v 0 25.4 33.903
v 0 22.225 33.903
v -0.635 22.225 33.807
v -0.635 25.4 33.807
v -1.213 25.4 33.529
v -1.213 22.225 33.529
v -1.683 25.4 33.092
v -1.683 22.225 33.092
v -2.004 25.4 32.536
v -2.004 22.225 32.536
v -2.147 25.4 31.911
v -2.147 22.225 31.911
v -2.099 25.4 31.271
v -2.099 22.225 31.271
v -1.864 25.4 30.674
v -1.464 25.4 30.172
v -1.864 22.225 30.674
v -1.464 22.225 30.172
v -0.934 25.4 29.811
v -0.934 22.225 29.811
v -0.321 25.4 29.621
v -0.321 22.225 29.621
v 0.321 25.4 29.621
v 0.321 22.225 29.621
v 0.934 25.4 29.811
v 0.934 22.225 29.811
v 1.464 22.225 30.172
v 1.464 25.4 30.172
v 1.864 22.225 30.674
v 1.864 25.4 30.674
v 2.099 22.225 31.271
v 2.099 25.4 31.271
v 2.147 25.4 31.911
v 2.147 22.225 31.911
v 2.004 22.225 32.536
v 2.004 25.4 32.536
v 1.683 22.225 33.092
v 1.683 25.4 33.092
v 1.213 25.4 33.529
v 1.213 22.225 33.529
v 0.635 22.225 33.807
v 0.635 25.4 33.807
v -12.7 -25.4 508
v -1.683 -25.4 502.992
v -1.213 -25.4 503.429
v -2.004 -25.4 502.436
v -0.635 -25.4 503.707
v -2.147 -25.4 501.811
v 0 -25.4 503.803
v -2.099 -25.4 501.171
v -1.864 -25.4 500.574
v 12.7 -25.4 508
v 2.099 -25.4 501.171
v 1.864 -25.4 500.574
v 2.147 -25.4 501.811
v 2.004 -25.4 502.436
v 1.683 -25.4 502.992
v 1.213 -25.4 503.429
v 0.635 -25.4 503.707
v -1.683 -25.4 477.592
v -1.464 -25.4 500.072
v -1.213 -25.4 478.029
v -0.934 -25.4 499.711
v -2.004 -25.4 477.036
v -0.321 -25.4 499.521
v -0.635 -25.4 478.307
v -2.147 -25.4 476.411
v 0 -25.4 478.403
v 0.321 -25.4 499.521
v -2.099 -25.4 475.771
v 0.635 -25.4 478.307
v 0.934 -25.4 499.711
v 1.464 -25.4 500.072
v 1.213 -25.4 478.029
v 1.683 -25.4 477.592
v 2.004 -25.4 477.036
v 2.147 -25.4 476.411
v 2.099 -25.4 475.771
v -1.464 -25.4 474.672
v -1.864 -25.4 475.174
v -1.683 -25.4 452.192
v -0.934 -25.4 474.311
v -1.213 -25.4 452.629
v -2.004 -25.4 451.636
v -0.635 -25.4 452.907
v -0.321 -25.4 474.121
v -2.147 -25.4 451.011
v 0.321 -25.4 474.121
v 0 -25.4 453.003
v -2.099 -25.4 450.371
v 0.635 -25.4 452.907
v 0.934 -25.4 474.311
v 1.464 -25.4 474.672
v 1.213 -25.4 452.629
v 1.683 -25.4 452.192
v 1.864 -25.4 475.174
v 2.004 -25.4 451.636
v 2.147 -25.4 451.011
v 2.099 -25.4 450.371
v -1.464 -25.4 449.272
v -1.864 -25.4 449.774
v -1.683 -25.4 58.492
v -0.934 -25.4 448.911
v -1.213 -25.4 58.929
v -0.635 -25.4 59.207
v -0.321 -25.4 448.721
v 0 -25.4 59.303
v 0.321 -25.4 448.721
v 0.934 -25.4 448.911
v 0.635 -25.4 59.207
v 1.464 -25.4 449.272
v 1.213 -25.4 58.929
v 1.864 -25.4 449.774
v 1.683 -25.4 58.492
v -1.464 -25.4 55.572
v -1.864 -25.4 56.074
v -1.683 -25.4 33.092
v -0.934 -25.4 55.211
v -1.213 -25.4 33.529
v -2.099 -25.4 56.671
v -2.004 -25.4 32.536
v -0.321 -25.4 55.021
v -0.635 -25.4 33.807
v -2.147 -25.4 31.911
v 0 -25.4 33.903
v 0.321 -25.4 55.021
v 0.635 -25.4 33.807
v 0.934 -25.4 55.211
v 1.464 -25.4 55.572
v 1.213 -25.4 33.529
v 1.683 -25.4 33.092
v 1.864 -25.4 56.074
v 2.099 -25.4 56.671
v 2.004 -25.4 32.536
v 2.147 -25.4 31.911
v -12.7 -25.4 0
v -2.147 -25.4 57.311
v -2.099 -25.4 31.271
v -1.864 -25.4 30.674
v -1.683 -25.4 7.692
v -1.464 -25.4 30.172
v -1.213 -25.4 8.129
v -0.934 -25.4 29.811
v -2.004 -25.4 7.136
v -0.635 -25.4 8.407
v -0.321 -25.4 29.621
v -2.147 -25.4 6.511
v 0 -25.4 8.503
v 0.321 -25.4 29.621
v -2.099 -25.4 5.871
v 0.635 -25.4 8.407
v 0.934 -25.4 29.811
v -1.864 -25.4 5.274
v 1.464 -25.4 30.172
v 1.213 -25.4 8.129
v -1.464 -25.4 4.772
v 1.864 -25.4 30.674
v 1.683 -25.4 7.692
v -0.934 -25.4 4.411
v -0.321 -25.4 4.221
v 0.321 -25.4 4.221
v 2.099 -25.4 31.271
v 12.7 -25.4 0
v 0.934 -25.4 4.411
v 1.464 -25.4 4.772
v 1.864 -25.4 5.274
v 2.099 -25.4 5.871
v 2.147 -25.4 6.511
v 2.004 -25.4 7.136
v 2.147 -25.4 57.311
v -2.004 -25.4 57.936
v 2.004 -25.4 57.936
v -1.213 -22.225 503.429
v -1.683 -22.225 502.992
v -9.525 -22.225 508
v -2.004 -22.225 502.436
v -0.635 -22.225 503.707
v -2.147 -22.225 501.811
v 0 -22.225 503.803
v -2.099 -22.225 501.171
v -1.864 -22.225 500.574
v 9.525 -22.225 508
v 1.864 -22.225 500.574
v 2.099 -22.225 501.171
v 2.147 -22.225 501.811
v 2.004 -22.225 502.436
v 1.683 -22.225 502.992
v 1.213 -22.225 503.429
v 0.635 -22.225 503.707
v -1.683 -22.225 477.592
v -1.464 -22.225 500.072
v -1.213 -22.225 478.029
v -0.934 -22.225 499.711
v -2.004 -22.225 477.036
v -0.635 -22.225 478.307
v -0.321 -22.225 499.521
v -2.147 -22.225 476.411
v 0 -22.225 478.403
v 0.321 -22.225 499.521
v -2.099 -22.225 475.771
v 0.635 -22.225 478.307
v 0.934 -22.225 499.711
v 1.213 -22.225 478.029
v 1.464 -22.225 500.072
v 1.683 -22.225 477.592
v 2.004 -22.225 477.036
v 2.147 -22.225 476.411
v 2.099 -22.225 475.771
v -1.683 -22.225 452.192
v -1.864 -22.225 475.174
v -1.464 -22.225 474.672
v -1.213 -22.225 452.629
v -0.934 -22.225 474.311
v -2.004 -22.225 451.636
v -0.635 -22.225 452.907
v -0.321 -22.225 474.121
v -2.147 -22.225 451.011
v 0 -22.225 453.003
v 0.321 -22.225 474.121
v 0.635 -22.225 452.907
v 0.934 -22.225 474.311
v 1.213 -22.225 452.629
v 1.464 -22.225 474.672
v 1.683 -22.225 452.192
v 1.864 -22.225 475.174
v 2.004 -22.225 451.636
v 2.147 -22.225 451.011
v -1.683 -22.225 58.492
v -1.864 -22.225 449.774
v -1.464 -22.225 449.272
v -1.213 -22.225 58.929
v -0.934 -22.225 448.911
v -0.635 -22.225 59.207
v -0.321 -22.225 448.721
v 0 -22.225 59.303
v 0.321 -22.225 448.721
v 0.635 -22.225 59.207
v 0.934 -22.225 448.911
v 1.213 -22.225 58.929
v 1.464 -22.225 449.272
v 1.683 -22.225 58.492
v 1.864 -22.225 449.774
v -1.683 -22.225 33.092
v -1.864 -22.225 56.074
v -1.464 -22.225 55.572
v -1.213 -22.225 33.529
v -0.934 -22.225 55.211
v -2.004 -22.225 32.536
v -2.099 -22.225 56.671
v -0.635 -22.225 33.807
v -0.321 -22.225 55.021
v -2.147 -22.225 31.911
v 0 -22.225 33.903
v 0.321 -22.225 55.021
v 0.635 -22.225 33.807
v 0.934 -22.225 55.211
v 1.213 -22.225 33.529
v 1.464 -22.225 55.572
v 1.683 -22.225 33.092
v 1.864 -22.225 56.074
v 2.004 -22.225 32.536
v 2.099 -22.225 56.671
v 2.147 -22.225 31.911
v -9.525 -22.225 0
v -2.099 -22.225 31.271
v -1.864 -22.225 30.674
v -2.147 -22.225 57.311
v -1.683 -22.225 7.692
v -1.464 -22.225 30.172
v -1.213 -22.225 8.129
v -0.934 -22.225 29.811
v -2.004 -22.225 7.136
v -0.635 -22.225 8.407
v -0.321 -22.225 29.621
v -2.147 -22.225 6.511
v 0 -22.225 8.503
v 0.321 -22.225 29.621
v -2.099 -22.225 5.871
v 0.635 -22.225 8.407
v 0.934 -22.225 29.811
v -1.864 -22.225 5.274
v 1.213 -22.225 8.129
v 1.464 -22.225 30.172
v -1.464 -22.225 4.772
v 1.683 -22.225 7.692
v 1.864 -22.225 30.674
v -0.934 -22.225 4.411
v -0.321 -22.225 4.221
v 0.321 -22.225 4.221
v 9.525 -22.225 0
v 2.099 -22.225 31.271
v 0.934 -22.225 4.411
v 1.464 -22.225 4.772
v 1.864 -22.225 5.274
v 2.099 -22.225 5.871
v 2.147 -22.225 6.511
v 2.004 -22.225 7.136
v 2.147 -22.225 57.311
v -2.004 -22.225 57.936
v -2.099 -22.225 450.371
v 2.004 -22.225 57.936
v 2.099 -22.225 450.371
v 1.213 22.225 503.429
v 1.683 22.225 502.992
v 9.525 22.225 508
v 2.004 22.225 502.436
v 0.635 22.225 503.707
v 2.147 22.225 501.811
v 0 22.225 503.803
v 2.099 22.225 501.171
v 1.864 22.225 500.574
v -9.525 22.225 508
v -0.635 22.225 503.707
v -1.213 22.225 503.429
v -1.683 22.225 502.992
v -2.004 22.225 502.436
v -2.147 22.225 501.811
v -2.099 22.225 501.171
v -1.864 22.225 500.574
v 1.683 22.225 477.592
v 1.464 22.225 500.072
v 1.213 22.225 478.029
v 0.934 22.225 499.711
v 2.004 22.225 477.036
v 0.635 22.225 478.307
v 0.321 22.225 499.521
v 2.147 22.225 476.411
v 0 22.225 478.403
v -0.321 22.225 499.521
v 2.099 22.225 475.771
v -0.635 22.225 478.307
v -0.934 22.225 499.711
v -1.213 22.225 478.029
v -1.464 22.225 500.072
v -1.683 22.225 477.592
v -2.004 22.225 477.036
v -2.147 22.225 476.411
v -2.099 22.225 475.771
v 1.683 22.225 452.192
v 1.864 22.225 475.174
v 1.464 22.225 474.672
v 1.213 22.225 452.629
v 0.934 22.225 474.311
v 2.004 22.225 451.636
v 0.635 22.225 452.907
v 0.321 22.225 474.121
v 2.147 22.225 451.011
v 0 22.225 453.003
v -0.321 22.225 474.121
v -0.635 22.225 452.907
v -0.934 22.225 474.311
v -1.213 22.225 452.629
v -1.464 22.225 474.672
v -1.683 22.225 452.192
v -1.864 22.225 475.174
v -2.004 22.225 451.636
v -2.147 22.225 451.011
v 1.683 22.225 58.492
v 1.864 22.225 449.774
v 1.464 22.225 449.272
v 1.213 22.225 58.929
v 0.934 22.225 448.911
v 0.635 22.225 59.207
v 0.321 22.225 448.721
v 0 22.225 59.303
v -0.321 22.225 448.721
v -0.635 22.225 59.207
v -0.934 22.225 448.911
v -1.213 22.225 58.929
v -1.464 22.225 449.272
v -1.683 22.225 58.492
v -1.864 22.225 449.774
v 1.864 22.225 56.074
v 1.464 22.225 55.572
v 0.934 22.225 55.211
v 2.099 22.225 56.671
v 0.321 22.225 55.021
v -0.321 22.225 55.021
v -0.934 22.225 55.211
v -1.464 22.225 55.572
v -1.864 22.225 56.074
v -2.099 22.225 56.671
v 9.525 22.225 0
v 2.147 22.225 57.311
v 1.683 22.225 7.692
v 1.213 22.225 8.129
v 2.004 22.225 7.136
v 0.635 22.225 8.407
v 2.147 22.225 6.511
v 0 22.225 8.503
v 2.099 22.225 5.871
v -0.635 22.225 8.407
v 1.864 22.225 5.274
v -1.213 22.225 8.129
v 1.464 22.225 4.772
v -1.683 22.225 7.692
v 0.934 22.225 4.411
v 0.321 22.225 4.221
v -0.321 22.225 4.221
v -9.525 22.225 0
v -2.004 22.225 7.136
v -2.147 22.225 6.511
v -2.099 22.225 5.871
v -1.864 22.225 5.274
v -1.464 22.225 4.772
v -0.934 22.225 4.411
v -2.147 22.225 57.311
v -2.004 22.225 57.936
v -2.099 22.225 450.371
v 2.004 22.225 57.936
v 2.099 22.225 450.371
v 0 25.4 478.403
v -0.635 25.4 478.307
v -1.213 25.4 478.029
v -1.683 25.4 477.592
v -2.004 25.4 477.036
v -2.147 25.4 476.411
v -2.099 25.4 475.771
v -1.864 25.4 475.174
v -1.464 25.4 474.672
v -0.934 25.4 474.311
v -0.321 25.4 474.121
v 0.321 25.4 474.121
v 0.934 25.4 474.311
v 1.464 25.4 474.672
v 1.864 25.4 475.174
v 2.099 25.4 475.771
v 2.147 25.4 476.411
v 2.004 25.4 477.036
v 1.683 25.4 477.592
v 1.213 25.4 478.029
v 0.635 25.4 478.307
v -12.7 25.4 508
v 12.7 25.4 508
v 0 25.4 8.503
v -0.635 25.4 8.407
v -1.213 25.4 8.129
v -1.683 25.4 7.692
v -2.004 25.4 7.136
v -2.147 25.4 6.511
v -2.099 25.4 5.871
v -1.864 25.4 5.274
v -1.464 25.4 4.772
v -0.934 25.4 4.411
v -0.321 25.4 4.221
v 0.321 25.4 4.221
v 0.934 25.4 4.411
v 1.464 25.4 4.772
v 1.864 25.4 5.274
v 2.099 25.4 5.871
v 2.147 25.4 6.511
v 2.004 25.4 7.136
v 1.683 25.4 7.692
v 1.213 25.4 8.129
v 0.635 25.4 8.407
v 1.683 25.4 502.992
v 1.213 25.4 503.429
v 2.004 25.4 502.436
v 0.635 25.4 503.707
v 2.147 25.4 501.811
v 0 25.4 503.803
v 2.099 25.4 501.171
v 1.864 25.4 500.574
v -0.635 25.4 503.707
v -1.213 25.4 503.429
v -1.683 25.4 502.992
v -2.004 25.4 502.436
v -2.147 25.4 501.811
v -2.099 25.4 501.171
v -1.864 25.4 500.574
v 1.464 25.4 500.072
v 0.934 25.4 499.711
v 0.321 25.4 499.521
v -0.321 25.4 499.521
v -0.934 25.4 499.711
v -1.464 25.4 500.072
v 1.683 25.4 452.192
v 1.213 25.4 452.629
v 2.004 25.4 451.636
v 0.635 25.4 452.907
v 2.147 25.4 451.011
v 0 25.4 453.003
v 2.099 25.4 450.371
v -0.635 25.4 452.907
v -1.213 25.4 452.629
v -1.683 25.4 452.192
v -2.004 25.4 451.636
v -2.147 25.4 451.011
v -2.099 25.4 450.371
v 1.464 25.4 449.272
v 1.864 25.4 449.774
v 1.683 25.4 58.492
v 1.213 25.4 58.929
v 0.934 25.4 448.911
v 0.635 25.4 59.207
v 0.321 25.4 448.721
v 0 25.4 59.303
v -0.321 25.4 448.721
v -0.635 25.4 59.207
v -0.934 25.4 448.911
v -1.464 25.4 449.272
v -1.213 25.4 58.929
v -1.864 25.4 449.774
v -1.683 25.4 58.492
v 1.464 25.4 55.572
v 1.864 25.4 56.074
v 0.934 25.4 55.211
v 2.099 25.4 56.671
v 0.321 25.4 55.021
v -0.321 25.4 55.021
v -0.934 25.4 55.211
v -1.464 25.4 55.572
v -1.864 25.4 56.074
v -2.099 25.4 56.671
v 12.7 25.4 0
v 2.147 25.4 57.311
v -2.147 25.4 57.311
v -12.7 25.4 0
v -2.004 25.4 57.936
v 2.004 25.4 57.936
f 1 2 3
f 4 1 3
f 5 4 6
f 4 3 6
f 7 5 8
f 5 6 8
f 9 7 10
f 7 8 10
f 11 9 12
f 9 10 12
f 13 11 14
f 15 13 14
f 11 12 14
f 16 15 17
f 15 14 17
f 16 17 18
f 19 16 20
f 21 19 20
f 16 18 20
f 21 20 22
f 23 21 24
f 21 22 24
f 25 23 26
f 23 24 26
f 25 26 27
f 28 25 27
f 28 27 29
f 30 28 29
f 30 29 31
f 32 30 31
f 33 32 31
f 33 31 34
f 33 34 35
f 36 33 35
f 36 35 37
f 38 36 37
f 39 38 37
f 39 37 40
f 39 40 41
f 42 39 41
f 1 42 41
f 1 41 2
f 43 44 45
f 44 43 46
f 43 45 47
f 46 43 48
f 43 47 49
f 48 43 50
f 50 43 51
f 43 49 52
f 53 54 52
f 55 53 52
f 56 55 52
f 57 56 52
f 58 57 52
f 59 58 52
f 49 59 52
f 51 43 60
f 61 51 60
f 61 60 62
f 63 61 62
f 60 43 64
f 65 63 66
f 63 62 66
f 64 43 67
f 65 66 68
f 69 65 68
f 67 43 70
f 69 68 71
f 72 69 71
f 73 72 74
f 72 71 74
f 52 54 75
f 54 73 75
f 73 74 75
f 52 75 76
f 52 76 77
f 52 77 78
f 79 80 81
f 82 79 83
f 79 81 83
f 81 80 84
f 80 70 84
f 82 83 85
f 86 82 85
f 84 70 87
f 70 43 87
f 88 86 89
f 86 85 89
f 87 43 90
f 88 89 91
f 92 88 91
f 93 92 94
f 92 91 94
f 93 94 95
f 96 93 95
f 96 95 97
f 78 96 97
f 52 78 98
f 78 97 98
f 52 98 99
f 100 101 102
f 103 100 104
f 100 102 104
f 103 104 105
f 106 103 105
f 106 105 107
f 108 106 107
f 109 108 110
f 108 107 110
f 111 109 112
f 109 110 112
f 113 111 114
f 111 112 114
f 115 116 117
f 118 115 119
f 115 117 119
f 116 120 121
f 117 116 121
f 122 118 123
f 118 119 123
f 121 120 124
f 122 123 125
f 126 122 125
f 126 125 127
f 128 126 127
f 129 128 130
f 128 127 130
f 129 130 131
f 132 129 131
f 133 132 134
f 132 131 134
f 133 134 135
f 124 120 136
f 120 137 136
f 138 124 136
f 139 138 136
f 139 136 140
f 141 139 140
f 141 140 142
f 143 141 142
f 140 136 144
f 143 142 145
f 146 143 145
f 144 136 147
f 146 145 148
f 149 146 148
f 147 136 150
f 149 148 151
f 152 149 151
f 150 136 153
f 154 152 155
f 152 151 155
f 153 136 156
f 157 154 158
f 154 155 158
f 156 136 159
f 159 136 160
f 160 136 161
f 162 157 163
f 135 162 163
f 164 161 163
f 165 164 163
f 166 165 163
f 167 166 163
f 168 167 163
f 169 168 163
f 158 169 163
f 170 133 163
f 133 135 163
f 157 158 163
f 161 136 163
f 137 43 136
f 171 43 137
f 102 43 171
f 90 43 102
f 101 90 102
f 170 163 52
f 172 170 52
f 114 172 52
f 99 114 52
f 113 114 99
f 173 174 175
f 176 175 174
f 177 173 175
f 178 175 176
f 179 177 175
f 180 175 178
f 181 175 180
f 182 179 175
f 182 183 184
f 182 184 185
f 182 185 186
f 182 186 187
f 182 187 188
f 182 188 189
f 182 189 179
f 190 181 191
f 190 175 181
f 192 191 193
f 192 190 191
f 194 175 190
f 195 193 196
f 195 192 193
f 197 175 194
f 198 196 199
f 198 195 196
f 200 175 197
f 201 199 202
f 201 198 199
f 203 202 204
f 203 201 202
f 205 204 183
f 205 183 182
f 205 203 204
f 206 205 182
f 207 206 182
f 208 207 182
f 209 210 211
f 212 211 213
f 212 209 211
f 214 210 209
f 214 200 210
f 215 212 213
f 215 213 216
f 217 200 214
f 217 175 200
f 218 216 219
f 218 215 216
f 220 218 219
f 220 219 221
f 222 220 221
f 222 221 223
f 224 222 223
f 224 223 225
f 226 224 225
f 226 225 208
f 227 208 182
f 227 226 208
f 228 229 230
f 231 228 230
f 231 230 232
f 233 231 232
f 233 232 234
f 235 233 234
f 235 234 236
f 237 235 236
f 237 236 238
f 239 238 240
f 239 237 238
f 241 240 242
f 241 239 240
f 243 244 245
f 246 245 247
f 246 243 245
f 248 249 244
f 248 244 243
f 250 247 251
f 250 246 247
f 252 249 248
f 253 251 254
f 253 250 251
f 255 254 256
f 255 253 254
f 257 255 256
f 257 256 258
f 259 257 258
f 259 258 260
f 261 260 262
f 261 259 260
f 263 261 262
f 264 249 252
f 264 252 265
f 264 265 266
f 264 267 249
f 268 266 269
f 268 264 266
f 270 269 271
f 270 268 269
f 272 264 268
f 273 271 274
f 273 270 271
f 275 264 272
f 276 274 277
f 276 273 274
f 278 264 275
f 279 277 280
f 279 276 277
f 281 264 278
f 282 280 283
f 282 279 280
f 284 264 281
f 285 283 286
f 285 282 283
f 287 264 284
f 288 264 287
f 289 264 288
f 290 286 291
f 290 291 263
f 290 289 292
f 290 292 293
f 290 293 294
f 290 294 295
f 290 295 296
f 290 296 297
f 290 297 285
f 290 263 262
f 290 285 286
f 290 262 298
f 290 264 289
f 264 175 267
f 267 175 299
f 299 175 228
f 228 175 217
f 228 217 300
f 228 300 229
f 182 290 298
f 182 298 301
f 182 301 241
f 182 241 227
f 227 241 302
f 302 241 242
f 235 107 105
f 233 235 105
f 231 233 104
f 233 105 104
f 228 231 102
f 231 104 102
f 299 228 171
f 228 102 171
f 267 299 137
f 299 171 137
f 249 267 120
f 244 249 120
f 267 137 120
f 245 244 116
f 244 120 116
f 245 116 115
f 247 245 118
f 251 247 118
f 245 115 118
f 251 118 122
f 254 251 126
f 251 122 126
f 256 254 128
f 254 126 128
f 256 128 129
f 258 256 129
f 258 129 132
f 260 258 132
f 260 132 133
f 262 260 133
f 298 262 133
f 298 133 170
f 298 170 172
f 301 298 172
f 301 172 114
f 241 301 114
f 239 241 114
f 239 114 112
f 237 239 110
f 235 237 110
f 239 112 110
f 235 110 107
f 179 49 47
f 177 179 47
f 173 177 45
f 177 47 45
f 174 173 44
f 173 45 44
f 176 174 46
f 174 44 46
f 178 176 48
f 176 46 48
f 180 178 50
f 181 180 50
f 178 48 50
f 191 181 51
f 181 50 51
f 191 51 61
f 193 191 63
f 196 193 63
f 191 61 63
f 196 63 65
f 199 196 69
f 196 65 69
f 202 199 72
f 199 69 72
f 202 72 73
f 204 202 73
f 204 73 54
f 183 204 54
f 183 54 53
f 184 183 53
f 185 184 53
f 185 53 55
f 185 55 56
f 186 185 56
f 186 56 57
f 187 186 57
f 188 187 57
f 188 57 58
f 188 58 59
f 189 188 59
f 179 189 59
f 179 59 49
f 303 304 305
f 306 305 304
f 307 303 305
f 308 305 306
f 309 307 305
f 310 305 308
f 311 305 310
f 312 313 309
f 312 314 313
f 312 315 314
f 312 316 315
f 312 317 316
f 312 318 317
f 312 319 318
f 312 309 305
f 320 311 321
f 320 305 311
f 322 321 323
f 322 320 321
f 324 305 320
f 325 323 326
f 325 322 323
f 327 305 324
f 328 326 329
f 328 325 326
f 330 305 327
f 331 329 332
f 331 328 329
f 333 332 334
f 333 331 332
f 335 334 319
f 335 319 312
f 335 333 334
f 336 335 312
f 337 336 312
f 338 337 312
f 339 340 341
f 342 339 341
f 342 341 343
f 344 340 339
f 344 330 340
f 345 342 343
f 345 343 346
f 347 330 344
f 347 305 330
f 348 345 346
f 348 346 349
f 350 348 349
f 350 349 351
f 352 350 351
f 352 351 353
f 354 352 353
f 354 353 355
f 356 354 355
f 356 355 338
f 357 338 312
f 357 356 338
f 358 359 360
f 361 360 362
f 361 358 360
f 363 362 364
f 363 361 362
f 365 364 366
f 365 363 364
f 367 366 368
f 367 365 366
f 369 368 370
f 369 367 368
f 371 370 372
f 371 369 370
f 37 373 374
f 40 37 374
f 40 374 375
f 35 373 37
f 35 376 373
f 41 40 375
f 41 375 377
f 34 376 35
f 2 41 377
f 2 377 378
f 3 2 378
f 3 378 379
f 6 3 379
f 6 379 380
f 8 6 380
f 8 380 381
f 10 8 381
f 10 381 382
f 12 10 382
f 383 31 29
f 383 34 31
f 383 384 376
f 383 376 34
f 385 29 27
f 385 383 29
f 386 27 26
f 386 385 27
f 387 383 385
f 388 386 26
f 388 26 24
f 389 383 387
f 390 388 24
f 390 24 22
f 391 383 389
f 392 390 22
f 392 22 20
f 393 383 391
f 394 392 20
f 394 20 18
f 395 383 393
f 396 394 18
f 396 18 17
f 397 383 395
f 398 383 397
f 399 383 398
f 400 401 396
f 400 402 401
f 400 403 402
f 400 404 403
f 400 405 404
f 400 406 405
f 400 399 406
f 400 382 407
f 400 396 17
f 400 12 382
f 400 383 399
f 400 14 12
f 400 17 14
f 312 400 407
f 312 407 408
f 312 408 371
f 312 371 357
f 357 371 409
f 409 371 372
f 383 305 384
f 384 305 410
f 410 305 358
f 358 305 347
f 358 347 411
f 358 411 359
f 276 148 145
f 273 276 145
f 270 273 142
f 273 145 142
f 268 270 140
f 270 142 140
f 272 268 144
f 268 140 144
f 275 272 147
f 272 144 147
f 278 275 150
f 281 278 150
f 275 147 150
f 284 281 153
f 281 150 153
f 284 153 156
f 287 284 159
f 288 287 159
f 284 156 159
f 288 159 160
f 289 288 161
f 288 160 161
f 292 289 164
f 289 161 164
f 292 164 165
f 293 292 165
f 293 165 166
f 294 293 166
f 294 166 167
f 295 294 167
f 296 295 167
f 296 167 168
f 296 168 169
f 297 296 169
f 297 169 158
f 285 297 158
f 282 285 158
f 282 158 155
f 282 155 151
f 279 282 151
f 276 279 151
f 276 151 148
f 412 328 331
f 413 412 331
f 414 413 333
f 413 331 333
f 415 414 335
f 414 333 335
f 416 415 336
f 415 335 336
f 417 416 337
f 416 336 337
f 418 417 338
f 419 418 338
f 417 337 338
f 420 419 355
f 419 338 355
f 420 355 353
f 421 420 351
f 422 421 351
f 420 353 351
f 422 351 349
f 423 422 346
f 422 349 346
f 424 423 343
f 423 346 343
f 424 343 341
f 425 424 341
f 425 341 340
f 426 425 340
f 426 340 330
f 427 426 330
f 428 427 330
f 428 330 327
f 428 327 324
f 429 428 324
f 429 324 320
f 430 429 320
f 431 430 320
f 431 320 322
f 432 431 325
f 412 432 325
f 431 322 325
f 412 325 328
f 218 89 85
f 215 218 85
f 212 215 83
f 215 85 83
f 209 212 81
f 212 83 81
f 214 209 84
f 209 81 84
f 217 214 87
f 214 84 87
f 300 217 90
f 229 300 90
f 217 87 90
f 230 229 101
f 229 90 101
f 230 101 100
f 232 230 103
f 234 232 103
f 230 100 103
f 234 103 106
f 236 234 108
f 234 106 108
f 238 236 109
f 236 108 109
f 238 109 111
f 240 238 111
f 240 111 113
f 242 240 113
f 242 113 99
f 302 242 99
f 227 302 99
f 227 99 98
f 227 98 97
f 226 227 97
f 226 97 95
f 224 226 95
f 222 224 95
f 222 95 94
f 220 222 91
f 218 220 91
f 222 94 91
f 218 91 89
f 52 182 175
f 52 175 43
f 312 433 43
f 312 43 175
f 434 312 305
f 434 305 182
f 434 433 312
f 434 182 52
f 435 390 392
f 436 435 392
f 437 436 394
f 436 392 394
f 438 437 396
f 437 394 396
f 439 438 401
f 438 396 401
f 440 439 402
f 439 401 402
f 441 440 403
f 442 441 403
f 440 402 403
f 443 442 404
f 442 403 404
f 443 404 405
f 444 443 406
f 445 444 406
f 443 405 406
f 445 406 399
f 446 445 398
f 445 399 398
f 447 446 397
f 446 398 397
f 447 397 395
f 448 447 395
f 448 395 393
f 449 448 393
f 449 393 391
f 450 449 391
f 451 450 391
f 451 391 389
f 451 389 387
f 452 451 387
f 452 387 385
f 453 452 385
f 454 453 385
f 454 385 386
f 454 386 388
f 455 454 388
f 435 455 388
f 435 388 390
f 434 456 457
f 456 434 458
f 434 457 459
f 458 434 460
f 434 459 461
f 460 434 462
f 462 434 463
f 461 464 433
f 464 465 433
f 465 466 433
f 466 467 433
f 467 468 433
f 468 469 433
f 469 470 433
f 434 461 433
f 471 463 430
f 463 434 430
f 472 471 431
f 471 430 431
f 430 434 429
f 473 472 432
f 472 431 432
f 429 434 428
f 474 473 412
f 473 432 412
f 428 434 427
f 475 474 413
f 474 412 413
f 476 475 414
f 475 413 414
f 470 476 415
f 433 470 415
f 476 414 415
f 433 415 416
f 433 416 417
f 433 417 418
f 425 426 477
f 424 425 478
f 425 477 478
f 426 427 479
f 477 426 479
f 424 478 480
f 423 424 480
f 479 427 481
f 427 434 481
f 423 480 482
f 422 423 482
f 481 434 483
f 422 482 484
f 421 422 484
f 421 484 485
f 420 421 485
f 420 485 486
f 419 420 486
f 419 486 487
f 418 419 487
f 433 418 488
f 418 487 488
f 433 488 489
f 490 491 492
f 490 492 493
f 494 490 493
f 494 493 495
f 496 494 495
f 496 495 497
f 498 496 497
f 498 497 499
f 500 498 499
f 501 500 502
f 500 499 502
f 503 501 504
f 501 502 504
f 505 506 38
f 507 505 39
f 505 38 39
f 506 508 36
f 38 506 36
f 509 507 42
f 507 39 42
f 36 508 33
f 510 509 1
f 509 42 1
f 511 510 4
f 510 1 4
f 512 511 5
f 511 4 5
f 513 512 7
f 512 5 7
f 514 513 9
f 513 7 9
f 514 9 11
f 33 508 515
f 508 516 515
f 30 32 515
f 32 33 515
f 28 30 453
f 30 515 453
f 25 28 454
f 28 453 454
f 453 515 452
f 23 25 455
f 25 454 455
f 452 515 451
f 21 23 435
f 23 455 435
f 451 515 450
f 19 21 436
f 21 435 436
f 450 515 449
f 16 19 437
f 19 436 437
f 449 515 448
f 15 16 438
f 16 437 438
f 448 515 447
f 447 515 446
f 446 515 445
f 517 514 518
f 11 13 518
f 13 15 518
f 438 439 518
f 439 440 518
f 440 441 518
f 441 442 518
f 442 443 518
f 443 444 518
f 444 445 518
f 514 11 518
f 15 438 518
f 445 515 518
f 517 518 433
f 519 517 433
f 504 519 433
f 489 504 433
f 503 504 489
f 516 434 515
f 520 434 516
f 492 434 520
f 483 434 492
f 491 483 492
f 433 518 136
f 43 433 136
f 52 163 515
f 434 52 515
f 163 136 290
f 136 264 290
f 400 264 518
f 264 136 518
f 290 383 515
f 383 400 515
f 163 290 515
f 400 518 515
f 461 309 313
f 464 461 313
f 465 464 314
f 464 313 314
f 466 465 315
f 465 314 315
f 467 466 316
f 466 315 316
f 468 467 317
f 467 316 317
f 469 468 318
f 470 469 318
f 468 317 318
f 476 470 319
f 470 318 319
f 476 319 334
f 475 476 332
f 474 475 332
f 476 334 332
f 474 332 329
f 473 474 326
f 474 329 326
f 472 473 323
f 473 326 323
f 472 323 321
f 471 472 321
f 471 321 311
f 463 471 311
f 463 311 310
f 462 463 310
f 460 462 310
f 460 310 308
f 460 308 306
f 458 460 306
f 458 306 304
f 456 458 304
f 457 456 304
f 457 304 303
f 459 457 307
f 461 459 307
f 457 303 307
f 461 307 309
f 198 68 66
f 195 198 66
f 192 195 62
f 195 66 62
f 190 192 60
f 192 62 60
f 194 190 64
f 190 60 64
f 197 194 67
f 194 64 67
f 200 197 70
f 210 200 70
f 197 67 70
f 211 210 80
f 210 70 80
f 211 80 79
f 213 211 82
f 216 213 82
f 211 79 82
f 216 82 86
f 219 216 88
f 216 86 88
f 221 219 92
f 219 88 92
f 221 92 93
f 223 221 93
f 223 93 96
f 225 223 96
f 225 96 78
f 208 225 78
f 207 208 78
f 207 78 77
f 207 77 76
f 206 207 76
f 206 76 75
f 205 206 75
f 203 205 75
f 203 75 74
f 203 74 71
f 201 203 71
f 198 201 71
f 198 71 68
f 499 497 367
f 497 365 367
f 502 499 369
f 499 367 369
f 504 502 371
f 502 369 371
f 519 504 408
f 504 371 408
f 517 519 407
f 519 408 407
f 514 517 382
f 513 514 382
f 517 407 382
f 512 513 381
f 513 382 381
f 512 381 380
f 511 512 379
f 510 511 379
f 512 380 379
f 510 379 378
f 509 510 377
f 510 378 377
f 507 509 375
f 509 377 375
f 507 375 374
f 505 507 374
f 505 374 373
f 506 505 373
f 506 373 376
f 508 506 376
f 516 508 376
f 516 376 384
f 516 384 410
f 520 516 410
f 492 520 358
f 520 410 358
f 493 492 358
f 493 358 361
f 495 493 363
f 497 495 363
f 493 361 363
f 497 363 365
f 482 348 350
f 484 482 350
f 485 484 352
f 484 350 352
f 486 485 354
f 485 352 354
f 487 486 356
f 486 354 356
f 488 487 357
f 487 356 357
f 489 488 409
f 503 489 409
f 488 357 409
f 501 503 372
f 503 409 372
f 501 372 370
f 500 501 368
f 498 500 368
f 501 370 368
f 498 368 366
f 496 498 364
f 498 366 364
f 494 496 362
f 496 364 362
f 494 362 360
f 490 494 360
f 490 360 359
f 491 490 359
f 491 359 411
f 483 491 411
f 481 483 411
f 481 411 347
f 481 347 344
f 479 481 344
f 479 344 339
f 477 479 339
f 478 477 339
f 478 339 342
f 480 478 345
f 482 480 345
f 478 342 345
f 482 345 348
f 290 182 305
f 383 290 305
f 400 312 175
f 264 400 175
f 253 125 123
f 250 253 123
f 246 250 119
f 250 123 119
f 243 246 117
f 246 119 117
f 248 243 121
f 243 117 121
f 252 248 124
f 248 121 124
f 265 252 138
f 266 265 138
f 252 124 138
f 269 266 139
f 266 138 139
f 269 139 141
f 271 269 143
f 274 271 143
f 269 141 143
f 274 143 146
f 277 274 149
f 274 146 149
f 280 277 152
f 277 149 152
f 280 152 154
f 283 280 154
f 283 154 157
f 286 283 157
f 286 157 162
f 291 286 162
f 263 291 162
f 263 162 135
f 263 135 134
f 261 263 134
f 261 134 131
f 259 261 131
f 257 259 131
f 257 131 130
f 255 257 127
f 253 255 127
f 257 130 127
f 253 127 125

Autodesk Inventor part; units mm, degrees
ref_plane "YZ Plane" through (0, 0, 0) normal (1, 0, 0) x (0, 1, 0)
ref_plane "Start Plane" through (0, 0, 0) normal (0, 0, 1) x (1, 0, 0)
ref_plane "End Plane" through (0, 0, 508) normal (0, 0, 1) x (1, 0, 0)
sketch "Sketch" plane through (0, 0, 0) normal (0, 0, 1) x (1, 0, 0)
  line L0 (-12.7, -25.4) -> (12.7, -25.4)
  line L1 (12.7, -25.4) -> (12.7, 25.4)
  line L2 (12.7, 25.4) -> (-12.7, 25.4)
  line L3 (-12.7, 25.4) -> (-12.7, -25.4)
  line L4 (-12.7, -25.4) -> (12.7, 25.4) construction
  line L5 (12.7, -25.4) -> (-12.7, 25.4) construction
  line L6 (-9.525, -22.225) -> (9.525, -22.225)
  line L7 (9.525, -22.225) -> (9.525, 22.225)
  line L8 (9.525, 22.225) -> (-9.525, 22.225)
  line L9 (-9.525, 22.225) -> (-9.525, -22.225)
  line L10 (-9.525, -22.225) -> (9.525, 22.225) construction
  line L11 (9.525, -22.225) -> (-9.525, 22.225) construction
  point P0 (0, 0)
  dimension "d0" = 25.4
  dimension "d1" = 50.8
  dimension "d2" = 3.175
  dimension "d3" = 3.175
extrude "Body" add sketch "Sketch" along normal up to surface (508 mm away) from surface at 0
sketch "Sketch6" plane through (0, 0, 0) normal (0, 0, 1) x (1, 0, 0)
  line L0 (0, 0) -> (10, 0)
ref_plane "Work Plane5" through (0, 0, 0) normal (0, -1, 0) x (1, 0, 0)
sketch "Sketch7" plane through (0, 0, 0) normal (0, -1, 0) x (1, 0, 0)
  line L0 (-2, 0) -> (12, 0)
  line L1 (-2, 508) -> (12, 508)
  dimension "d11" = 508
sketch "Sketch8" plane through (-12.7, 25.4, 508) normal (0, 1, 0) x (1, 0, 0)
  point P0 (12.7, 508)
sketch "Sketch9" plane through (-12.7, 25.4, 508) normal (0, 1, 0) x (1, 0, 0)
  line L0 (0, 508) -> (25.4, 508) projected
  line L1 (0, 0) -> (25.4, 0) projected
  point P0 (12.7, 508)
  point P1 (12.7, 501.65)
  point P2 (12.7, 476.25)
  point P3 (12.7, 450.85)
  point P4 (12.7, 6.35)
  point P5 (12.7, 31.75)
  point P6 (12.7, 57.15)
  point P7 (12.7, 0)
  dimension "d16" = 6.35
  dimension "d17" = 25.4
  dimension "d18" = 25.4
  dimension "d19" = 6.35
  dimension "d20" = 25.4
  dimension "d21" = 25.4
hole "Hole1" at (0, 25.4, 501.65) at (0, 25.4, 476.25) at (0, 25.4, 450.85) at (0, 25.4, 57.15) at (0, 25.4, 31.75) at (0, 25.4, 6.35) direction (0, -1, 0) diameter 4.3053 depth 50.8 tip angle 118 clearance for "Pop Rivet" size "5/32" standard "4859 Fastners"
equation "\"d0\" = Width"
equation "\"d1\" = Height"
equation "\"d2\" = Thickness"
equation "\"d3\" = Thickness"
equation "\"Height\" = 50.8"
equation "\"Width\" = 25.4"
equation "\"Thickness\" = 3.175"
equation "\"BaseLength\" = 508"
equation "\"G_OFFSET_START\" = 0"
equation "\"G_OFFSET_END\" = 0"
equation "\"d7\" = BaseLength + G_OFFSET_END"
equation "\"G_L\" = d11"
properties part number "AL RECT TUBE 2 x 1 x 0.125" material "Aluminum 6061"
